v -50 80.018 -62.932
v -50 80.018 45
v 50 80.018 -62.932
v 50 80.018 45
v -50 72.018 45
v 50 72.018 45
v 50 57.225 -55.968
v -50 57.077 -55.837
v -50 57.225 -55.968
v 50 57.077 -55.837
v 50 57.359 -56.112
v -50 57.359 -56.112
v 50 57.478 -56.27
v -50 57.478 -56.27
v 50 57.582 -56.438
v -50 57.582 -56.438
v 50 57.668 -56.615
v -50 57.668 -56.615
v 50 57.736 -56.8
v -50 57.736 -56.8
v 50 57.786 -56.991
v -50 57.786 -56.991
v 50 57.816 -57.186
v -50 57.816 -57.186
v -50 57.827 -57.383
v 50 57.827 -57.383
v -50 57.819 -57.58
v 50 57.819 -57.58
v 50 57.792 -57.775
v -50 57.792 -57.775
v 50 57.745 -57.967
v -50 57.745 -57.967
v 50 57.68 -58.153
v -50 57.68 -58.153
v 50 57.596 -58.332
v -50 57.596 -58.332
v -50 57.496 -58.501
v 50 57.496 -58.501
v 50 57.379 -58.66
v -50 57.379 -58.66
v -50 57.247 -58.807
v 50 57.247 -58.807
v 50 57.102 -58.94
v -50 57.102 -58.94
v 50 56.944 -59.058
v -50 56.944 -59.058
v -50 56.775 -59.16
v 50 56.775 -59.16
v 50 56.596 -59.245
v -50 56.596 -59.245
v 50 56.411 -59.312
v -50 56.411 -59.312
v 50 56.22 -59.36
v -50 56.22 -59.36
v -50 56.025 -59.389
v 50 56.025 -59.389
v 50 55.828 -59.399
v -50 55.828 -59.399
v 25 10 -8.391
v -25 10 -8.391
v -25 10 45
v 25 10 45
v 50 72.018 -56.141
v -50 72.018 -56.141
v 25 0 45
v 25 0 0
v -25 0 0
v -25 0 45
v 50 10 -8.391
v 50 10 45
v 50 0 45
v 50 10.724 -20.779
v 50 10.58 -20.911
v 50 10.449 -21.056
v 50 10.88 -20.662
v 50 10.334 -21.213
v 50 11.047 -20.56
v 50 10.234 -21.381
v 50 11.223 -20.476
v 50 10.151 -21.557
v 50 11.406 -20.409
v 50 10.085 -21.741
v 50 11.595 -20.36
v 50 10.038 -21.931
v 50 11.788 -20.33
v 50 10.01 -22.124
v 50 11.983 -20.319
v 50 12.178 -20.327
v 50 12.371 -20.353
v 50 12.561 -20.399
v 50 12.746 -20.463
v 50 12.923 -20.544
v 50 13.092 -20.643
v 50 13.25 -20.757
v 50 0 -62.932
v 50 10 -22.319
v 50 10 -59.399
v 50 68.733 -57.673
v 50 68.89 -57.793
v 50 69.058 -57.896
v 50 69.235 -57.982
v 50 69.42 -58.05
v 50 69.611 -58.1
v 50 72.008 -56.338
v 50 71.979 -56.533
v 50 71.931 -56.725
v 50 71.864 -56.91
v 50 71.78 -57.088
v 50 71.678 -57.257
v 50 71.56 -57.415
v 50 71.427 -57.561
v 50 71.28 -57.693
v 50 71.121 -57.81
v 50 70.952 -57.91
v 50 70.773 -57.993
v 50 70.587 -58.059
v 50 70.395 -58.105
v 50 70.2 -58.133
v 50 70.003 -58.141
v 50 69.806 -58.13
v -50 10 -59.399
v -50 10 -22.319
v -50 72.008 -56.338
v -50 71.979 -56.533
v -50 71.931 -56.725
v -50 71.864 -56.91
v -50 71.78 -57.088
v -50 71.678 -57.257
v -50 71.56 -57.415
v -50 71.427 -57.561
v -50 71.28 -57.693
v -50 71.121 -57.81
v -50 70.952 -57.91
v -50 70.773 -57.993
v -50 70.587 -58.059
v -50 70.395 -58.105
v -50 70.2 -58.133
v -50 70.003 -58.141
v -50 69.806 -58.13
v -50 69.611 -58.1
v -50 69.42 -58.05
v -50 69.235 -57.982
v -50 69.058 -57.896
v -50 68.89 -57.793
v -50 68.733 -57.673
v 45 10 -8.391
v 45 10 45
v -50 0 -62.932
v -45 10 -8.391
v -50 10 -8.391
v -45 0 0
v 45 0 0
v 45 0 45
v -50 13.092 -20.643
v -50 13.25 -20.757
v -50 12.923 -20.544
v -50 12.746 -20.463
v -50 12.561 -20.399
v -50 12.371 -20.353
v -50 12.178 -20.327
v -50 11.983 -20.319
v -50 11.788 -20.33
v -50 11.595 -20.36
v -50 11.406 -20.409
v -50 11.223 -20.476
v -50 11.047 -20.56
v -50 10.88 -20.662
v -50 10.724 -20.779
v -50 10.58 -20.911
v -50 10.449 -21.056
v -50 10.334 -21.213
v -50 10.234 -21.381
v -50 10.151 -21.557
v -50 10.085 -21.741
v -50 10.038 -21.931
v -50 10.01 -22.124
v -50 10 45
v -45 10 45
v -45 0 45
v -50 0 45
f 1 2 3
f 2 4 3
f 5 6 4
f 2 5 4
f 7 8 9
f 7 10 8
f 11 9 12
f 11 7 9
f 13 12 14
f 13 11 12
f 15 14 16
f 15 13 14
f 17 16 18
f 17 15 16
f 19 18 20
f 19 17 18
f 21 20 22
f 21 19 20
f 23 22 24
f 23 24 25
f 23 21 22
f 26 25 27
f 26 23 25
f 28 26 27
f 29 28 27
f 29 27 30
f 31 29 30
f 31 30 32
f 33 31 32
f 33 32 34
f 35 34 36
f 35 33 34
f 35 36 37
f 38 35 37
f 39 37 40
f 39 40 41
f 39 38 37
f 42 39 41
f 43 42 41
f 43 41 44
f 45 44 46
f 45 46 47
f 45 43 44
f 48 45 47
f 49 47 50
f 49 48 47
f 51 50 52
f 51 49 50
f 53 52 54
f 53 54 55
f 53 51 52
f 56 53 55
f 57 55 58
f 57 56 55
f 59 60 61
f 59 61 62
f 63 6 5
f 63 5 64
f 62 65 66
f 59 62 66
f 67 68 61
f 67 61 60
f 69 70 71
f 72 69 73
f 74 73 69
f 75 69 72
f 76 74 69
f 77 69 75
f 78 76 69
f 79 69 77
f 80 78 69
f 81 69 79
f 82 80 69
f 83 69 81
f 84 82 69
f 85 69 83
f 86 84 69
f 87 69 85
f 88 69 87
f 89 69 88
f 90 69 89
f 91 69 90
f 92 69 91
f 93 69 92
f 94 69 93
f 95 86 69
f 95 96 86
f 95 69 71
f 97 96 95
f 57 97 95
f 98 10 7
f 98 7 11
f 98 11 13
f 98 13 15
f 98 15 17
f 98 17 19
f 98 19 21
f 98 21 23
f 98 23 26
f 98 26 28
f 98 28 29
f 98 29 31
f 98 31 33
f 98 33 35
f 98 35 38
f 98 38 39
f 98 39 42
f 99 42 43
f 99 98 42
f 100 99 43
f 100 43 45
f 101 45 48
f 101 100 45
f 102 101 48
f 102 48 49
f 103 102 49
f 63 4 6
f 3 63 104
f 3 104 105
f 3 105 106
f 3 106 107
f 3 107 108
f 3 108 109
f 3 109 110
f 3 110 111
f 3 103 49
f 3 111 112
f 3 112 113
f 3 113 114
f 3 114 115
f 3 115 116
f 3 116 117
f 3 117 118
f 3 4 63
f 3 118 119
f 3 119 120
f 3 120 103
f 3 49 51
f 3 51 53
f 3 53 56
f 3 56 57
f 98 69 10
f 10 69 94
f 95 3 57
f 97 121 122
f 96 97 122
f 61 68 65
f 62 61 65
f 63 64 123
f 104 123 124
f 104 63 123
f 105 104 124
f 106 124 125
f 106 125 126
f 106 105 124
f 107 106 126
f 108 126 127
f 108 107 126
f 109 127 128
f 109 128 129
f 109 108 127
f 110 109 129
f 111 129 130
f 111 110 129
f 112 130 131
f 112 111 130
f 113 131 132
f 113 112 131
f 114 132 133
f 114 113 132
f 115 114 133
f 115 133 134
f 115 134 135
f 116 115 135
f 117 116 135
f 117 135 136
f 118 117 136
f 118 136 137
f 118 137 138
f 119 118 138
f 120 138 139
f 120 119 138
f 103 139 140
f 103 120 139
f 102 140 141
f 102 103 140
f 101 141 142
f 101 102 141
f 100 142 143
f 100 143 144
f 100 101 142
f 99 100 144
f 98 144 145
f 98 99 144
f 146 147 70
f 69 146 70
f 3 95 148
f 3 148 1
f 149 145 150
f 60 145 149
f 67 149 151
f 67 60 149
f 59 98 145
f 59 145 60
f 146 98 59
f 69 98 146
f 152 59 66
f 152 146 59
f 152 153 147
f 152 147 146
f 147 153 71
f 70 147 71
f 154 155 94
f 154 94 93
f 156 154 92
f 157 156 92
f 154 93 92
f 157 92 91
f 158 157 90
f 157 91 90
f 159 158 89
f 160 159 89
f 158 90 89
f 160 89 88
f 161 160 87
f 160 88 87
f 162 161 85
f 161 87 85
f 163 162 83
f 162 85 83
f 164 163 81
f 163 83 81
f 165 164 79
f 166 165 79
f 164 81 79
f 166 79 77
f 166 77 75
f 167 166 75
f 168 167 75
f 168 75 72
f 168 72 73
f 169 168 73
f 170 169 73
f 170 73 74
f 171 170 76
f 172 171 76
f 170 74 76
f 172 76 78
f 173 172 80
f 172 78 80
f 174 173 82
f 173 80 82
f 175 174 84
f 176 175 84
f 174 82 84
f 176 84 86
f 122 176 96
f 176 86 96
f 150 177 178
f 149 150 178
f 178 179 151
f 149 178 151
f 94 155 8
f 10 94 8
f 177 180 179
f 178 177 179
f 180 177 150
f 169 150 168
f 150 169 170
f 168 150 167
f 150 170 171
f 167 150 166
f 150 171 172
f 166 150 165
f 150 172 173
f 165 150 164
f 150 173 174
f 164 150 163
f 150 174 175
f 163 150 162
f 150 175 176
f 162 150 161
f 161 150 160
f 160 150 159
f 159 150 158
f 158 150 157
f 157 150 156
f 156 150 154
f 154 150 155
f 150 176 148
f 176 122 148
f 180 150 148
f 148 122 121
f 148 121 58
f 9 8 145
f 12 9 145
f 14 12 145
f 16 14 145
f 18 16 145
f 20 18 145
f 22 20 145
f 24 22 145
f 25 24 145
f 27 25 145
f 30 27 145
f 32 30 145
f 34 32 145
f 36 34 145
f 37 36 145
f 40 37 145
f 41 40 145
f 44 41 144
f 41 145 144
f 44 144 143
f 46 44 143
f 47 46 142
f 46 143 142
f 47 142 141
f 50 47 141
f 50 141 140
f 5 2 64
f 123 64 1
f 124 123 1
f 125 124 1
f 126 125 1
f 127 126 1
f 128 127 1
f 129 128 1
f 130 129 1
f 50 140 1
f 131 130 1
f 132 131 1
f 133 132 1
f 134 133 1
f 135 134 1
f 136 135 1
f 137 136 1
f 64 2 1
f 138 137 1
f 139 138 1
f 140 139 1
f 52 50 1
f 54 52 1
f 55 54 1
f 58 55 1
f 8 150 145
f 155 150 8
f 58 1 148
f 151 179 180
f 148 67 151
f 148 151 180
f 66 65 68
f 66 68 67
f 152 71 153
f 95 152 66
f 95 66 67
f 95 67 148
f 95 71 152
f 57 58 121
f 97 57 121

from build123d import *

# Parameters (mm, degrees)
SKETCH_2_W               = 5
SKETCH_2_H               = 90
EXTRUDE_1_DEPTH          = 10
EXTRUDE_1_2_DEPTH        = 10
SKETCH_2_W_2             = 50
EXTRUDE_1_3_DEPTH        = 10
EXTRUDE_5_DEPTH          = 50
SKETCH_5_W               = 107.932472338
SKETCH_5_H               = 8
EXTRUDE_6_DEPTH          = 50
CUT_EXTRUDE_1_DEPTH      = 114.416886857
CUT_EXTRUDE_1_DEPTH_BACK = 114.416886857
FILLET_1_R               = 2
FILLET_2_R               = 2


with BuildPart() as part:
    # 草图2 → 凸台-拉伸1 (new body)
    with BuildSketch(Plane(origin=(0, 0, 0), x_dir=(1, 0, 0), z_dir=(0, 1, 0))):
        with Locations((-47.5, 0)):
            Rectangle(SKETCH_2_W, SKETCH_2_H)
    extrude(amount=EXTRUDE_1_DEPTH)



with BuildPart() as body_2:
    # 草图2 → Extrude 1 2 (new body)
    with BuildSketch(Plane(origin=(0, 0, 0), x_dir=(1, 0, 0), z_dir=(0, 1, 0))):
        with Locations((47.5, 0)):
            Rectangle(SKETCH_2_W, SKETCH_2_H)
    extrude(amount=EXTRUDE_1_2_DEPTH)


with BuildPart() as body_3:
    # 草图2 → Extrude 1 3 (new body)
    with BuildSketch(Plane(origin=(0, 0, 0), x_dir=(1, 0, 0), z_dir=(0, 1, 0))):
        Rectangle(SKETCH_2_W_2, SKETCH_2_H)
    extrude(amount=EXTRUDE_1_3_DEPTH)


with BuildPart() as part_1:
    add(part.part)

    add(body_2.part)  # 凸台-拉伸5 merges body 2

    add(body_3.part)  # 凸台-拉伸5 merges body 3
    # 草图3 → 凸台-拉伸5 (add, symmetric)
    with BuildSketch(Plane(origin=(0, 0, 0), x_dir=(0, 0, -1), z_dir=(1, 0, 0))):
        Polygon((62.932472338, 75), (0, 0), (45, 0), (62.932472338, 0), align=None)
    extrude(amount=EXTRUDE_5_DEPTH, both=True)

    # 草图5 → 凸台-拉伸6 (add, symmetric)
    with BuildSketch(Plane(origin=(0, 0, 0), x_dir=(0, 0, -1), z_dir=(1, 0, 0))):
        with Locations((8.966236169, 76.018086392)):
            Rectangle(SKETCH_5_W, SKETCH_5_H)
    extrude(amount=EXTRUDE_6_DEPTH, both=True)

    # 草图6 → 切除-拉伸1 (cut, two sides: drawn at the far end of the back side and taken through both)
    with BuildSketch(Plane(origin=(0, 0, 0), x_dir=(0, 0, -1), z_dir=(1, 0, 0)).offset(-CUT_EXTRUDE_1_DEPTH_BACK)):
        Polygon((18.156116312, 10), (59.398505248, 61.526811336), (59.398505248, 10), align=None)
    extrude(amount=CUT_EXTRUDE_1_DEPTH + CUT_EXTRUDE_1_DEPTH_BACK, mode=Mode.SUBTRACT)

    # 圆角1
    fillet_1_edges = [part_1.edges().sort_by_distance(p)[0] for p in [
        (0, 61.526811336, -59.398505248),
        (0, 10, -18.156116312),
    ]]
    fillet(fillet_1_edges, radius=FILLET_1_R)

    # 圆角2
    fillet_2_edges = [part_1.edges().sort_by_distance(p)[0] for p in [
        (0, 72.018086392, -60.430349729),
    ]]
    fillet(fillet_2_edges, radius=FILLET_2_R)


solid = part_1.part
